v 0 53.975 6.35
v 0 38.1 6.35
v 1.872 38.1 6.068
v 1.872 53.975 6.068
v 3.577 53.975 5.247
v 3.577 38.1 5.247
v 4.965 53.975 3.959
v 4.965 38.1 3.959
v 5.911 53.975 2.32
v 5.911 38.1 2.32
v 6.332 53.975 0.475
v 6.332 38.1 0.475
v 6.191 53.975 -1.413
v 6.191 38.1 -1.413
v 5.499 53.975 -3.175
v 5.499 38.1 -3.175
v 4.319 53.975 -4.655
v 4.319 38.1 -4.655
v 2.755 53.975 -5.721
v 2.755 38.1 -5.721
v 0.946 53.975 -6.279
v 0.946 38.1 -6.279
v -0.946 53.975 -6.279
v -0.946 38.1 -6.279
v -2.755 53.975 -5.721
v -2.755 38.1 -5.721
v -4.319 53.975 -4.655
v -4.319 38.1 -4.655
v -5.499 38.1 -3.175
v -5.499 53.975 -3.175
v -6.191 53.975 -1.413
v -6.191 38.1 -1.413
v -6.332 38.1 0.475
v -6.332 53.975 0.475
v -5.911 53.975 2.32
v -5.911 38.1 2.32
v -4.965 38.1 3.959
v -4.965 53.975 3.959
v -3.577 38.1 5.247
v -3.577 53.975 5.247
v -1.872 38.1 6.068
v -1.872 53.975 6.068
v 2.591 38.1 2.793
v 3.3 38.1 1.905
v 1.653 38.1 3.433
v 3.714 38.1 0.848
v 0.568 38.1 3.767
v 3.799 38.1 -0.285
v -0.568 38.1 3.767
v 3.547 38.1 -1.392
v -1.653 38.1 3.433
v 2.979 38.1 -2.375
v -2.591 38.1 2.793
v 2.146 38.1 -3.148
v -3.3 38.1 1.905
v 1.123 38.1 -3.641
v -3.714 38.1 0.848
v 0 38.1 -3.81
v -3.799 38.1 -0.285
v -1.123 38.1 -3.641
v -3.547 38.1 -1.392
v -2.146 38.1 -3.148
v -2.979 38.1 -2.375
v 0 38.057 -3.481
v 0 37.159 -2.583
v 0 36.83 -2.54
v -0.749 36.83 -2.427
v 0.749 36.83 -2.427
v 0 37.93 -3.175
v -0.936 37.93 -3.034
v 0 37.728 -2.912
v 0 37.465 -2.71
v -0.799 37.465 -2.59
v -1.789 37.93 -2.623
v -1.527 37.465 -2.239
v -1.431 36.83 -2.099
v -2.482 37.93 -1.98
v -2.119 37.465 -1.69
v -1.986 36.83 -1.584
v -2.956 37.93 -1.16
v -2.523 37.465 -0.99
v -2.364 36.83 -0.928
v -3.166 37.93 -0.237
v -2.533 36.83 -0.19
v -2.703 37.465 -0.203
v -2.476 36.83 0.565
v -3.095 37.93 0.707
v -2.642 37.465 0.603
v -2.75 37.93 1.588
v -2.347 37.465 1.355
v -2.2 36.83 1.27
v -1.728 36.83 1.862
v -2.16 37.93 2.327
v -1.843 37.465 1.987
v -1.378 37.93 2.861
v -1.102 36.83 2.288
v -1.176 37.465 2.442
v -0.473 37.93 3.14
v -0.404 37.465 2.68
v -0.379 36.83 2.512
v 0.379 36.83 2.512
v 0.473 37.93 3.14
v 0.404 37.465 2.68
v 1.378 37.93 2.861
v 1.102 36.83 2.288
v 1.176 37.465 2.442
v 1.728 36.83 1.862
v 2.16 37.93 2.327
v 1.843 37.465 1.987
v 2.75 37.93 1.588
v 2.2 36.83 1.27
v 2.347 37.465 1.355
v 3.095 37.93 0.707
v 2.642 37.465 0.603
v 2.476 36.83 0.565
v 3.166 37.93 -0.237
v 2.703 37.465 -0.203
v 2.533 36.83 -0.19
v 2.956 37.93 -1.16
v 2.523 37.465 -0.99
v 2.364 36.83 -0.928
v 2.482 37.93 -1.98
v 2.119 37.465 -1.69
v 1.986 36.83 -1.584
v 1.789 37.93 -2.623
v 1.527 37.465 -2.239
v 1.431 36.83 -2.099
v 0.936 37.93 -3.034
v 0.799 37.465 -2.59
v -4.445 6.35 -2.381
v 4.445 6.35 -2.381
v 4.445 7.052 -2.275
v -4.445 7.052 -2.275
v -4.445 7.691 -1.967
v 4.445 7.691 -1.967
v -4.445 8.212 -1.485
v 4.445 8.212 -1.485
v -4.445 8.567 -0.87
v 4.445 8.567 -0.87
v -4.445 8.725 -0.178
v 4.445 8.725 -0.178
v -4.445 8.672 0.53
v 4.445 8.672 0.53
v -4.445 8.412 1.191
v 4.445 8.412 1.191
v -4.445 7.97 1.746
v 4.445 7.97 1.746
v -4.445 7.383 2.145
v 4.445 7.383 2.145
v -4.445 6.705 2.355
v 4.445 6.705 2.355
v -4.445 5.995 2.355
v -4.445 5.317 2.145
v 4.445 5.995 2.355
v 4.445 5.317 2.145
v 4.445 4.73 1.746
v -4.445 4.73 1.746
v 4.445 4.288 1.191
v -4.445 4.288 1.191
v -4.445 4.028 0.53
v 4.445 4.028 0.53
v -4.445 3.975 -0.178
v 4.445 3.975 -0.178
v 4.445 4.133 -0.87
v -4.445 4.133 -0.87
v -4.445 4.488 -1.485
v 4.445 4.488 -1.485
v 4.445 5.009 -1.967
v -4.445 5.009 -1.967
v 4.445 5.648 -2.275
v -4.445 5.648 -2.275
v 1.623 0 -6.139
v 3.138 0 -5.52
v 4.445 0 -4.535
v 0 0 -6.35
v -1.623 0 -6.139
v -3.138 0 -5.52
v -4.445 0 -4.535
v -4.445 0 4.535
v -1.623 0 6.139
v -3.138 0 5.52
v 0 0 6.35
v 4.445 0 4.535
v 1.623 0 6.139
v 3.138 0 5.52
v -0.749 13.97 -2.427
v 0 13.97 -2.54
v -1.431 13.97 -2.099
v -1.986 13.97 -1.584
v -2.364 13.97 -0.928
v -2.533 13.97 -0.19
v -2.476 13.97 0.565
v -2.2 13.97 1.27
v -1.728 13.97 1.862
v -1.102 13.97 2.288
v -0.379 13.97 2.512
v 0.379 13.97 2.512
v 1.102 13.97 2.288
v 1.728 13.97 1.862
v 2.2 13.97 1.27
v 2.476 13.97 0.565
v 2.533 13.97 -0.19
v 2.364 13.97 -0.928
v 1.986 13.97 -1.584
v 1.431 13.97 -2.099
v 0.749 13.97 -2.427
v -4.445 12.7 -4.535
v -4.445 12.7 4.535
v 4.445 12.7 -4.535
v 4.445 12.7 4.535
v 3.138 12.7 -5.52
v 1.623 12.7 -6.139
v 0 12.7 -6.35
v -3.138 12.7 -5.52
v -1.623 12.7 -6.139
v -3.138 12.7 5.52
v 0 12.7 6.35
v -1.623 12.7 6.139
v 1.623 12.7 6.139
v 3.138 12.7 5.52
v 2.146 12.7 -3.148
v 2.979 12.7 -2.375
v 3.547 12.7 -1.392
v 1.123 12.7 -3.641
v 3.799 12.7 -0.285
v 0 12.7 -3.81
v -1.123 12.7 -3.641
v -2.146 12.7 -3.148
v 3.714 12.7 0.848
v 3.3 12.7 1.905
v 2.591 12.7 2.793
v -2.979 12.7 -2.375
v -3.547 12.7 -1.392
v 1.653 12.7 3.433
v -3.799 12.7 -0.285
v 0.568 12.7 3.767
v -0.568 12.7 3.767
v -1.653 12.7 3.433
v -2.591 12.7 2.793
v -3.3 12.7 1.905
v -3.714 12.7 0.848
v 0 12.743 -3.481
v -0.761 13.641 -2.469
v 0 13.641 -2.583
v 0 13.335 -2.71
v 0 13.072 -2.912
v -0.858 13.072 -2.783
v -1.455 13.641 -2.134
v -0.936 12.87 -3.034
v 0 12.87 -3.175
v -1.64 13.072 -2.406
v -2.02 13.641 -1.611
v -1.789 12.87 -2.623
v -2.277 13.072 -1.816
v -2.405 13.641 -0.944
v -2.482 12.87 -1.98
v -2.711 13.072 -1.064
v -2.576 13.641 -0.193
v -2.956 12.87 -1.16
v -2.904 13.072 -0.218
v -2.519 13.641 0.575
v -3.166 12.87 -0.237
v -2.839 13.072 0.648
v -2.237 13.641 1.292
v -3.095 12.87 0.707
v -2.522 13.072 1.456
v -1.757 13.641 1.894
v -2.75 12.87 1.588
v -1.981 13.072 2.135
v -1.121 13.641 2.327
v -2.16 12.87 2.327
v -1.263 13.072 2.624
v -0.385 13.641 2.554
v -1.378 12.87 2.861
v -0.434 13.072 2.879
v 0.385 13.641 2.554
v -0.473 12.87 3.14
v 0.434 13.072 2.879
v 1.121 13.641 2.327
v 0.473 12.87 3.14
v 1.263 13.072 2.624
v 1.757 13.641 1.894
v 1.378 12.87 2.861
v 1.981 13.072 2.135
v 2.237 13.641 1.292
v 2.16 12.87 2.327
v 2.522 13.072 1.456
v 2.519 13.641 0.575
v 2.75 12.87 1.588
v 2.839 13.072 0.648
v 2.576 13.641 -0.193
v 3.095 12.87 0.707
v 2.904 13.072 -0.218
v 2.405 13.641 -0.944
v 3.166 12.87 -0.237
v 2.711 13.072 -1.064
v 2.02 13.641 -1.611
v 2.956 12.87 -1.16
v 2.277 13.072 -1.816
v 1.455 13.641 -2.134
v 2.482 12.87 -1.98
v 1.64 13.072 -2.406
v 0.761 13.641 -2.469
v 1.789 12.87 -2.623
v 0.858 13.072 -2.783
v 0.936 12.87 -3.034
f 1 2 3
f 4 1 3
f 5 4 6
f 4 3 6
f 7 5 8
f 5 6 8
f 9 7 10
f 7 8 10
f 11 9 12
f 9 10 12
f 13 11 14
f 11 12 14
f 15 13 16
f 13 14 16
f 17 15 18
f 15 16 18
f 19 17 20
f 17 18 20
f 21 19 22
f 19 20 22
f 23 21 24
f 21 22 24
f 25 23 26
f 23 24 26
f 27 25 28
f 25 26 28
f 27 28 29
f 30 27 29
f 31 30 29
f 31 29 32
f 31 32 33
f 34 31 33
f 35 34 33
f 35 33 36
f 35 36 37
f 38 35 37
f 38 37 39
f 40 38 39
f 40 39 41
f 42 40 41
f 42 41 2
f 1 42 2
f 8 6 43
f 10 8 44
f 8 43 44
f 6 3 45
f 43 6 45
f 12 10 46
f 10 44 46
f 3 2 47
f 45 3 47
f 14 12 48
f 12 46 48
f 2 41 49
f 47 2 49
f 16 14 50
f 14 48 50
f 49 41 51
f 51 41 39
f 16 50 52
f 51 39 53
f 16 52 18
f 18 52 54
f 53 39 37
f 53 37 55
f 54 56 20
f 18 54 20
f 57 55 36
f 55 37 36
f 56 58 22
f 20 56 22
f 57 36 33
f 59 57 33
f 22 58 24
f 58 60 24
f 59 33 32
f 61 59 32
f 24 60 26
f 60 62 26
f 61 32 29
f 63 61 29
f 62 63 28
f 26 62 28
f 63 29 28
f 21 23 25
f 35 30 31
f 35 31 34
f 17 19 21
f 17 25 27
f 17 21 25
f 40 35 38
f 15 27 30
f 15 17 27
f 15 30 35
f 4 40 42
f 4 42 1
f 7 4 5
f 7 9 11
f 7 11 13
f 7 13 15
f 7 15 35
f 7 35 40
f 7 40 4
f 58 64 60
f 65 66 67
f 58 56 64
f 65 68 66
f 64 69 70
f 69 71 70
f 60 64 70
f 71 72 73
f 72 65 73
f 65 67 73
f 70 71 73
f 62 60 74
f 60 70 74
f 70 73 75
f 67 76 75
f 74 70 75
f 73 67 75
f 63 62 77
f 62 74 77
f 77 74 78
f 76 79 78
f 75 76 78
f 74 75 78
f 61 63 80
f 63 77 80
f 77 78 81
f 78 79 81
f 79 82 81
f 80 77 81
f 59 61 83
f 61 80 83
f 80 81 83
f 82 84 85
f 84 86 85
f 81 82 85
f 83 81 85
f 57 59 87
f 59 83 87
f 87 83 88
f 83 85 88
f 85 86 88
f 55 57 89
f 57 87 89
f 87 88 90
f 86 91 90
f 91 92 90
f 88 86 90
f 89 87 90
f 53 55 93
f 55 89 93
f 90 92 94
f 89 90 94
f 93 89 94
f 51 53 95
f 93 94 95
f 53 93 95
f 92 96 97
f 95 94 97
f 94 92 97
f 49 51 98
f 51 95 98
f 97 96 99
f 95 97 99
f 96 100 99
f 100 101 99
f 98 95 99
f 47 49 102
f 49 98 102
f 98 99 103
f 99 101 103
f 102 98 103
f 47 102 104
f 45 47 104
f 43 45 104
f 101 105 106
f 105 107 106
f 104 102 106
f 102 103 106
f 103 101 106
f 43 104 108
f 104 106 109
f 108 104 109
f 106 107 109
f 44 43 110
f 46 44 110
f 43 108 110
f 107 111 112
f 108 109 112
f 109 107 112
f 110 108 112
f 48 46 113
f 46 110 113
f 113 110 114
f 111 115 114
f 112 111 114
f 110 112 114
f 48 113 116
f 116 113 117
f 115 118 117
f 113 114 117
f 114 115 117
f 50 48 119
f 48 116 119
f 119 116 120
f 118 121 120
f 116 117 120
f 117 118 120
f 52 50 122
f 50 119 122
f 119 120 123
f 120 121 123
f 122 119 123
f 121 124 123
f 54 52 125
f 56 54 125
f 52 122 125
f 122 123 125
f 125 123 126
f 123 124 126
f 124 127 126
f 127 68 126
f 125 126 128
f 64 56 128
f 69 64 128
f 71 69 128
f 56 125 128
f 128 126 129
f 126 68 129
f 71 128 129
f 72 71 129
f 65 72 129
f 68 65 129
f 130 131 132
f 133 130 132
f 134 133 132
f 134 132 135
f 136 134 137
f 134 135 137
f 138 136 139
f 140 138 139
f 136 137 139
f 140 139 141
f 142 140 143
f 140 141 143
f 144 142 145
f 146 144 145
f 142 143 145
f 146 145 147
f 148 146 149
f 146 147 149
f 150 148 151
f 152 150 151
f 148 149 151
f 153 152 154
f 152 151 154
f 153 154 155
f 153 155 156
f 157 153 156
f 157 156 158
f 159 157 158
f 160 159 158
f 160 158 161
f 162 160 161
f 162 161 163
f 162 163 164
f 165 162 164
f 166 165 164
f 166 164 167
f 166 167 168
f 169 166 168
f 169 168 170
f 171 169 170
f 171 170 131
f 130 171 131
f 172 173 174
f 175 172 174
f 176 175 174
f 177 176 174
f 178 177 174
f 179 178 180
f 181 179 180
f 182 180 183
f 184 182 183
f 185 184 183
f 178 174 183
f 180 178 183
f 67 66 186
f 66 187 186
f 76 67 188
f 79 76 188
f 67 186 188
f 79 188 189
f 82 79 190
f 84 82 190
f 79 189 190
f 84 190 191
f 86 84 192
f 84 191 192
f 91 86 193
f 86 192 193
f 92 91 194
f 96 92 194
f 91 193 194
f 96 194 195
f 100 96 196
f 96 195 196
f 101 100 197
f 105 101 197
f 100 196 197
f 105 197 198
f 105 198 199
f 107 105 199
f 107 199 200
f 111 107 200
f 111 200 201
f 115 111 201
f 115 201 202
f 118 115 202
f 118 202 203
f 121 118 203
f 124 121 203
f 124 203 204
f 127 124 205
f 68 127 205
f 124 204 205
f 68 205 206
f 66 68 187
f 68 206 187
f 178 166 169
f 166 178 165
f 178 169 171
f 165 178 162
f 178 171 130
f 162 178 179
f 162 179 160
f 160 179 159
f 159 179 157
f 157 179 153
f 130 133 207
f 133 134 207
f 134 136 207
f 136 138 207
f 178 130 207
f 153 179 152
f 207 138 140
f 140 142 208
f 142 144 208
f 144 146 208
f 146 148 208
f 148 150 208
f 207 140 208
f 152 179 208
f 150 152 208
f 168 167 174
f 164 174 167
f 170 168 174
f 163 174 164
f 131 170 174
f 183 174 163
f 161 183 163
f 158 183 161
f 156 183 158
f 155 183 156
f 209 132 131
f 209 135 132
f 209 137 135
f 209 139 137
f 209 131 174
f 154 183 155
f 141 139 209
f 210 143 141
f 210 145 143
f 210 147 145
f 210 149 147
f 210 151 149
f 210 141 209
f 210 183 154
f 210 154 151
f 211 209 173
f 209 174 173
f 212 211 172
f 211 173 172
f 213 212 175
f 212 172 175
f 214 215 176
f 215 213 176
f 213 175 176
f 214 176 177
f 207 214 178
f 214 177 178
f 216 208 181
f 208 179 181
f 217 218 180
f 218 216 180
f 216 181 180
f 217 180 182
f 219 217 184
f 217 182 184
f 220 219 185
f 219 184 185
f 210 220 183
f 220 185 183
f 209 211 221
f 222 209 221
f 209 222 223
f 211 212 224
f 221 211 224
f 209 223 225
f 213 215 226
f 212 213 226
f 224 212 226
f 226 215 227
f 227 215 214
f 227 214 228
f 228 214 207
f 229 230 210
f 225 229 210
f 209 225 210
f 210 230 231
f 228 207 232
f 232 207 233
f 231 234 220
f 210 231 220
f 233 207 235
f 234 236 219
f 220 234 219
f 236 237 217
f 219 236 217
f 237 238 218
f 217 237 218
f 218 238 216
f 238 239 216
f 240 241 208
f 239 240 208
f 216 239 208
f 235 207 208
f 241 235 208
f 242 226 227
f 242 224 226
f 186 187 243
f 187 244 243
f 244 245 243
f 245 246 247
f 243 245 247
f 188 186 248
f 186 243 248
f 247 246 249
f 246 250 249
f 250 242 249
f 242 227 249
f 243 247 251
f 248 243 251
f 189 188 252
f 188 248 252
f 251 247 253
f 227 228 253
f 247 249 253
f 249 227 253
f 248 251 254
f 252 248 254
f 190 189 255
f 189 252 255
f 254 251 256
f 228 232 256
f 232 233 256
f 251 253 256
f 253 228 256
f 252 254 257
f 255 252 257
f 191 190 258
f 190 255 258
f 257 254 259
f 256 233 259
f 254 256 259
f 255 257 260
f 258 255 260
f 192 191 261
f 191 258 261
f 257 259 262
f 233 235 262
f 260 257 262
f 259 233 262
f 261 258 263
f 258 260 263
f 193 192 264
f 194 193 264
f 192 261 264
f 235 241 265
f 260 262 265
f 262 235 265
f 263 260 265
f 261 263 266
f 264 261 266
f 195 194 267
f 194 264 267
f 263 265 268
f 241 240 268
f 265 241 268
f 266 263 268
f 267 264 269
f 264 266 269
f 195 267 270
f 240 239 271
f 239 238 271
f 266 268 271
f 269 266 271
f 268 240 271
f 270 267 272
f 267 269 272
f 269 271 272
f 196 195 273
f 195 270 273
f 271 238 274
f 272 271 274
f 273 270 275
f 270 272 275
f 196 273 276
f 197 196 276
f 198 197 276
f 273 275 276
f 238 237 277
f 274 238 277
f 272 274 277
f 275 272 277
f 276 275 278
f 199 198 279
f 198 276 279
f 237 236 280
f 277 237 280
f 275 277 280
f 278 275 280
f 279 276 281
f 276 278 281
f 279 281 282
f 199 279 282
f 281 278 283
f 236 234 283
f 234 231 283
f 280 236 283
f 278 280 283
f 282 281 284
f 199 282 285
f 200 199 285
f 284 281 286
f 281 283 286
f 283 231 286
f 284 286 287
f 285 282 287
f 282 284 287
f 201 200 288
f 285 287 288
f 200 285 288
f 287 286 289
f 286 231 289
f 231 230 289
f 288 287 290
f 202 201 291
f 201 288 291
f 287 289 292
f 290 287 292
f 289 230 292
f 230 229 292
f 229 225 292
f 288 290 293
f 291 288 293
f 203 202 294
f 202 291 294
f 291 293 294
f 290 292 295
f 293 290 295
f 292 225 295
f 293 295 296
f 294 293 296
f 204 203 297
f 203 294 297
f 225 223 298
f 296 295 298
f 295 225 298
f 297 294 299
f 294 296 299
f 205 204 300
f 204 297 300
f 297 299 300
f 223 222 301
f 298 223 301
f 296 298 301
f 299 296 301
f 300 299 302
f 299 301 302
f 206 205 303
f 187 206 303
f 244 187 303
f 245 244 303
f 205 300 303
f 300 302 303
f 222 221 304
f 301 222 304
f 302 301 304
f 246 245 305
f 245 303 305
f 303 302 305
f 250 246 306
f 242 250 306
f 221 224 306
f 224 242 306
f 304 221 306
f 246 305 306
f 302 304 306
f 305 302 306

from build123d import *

# Parameters (mm, degrees)
SKETCH1_R                      = 6.35
BOSS_EXTRUDE1_DEPTH            = 53.975
SKETCH3_W                      = 13.824388351
SKETCH3_H                      = 22.988870516
CUT_EXTRUDE1_DEPTH             = 55.716959208
F_3_16_0_1875_DIAMETER_HOLE1_D = 4.7625


with BuildPart() as part:
    # Sketch1 → Boss-Extrude1 (new body)
    with BuildSketch(Plane(origin=(0, 0, 0), x_dir=(1, 0, 0), z_dir=(0, 1, 0))):
        with Locations(Location((0, 0, 0), (0, 0, 270))):
            Circle(SKETCH1_R)
    extrude(amount=BOSS_EXTRUDE1_DEPTH)

    # Sketch2 → Cut-Revolve1 (revolve, cut)
    with BuildSketch(Plane.XY, mode=Mode.PRIVATE) as cut_revolve1_sk:
        with BuildLine():
            Line((26.057124612, 38.1), (3.81, 38.1))
            ThreePointArc((3.81, 38.1), (2.911974388, 37.728025612), (2.54, 36.83))
            Line((2.54, 36.83), (2.54, 13.97))
            ThreePointArc((2.54, 13.97), (2.911974388, 13.071974388), (3.81, 12.7))
            Line((3.81, 12.7), (26.057124612, 12.7))
            Line((26.057124612, 12.7), (26.057124612, 38.1))
        make_face()
    revolve(cut_revolve1_sk.sketch.rotate(Axis((0, 0, 0), (0, 1, 0)), 90), axis=Axis((0, 0, 0), (0, 1, 0)), mode=Mode.SUBTRACT)

    # Sketch3 → Cut-Extrude1 (cut, symmetric)
    with BuildSketch(Plane.XY):
        with Locations((11.357194176, 7.862043189)):
            Rectangle(SKETCH3_W, SKETCH3_H)
    cut_extrude1 = extrude(amount=CUT_EXTRUDE1_DEPTH, both=True, mode=Mode.SUBTRACT)

    # Mirror1: Cut-Extrude1 across plane
    add(cut_extrude1.mirror(Plane(origin=(0, 0, 0), x_dir=(0, 0, 1), z_dir=(1, 0, 0))), mode=Mode.SUBTRACT)

    # 3/16 (0.1875) Diameter Hole1 (through all)
    with Locations(Plane.ZY.offset(4.445)):
        with Locations((0, 6.35)):
            Hole(F_3_16_0_1875_DIAMETER_HOLE1_D / 2)


solid = part.part
